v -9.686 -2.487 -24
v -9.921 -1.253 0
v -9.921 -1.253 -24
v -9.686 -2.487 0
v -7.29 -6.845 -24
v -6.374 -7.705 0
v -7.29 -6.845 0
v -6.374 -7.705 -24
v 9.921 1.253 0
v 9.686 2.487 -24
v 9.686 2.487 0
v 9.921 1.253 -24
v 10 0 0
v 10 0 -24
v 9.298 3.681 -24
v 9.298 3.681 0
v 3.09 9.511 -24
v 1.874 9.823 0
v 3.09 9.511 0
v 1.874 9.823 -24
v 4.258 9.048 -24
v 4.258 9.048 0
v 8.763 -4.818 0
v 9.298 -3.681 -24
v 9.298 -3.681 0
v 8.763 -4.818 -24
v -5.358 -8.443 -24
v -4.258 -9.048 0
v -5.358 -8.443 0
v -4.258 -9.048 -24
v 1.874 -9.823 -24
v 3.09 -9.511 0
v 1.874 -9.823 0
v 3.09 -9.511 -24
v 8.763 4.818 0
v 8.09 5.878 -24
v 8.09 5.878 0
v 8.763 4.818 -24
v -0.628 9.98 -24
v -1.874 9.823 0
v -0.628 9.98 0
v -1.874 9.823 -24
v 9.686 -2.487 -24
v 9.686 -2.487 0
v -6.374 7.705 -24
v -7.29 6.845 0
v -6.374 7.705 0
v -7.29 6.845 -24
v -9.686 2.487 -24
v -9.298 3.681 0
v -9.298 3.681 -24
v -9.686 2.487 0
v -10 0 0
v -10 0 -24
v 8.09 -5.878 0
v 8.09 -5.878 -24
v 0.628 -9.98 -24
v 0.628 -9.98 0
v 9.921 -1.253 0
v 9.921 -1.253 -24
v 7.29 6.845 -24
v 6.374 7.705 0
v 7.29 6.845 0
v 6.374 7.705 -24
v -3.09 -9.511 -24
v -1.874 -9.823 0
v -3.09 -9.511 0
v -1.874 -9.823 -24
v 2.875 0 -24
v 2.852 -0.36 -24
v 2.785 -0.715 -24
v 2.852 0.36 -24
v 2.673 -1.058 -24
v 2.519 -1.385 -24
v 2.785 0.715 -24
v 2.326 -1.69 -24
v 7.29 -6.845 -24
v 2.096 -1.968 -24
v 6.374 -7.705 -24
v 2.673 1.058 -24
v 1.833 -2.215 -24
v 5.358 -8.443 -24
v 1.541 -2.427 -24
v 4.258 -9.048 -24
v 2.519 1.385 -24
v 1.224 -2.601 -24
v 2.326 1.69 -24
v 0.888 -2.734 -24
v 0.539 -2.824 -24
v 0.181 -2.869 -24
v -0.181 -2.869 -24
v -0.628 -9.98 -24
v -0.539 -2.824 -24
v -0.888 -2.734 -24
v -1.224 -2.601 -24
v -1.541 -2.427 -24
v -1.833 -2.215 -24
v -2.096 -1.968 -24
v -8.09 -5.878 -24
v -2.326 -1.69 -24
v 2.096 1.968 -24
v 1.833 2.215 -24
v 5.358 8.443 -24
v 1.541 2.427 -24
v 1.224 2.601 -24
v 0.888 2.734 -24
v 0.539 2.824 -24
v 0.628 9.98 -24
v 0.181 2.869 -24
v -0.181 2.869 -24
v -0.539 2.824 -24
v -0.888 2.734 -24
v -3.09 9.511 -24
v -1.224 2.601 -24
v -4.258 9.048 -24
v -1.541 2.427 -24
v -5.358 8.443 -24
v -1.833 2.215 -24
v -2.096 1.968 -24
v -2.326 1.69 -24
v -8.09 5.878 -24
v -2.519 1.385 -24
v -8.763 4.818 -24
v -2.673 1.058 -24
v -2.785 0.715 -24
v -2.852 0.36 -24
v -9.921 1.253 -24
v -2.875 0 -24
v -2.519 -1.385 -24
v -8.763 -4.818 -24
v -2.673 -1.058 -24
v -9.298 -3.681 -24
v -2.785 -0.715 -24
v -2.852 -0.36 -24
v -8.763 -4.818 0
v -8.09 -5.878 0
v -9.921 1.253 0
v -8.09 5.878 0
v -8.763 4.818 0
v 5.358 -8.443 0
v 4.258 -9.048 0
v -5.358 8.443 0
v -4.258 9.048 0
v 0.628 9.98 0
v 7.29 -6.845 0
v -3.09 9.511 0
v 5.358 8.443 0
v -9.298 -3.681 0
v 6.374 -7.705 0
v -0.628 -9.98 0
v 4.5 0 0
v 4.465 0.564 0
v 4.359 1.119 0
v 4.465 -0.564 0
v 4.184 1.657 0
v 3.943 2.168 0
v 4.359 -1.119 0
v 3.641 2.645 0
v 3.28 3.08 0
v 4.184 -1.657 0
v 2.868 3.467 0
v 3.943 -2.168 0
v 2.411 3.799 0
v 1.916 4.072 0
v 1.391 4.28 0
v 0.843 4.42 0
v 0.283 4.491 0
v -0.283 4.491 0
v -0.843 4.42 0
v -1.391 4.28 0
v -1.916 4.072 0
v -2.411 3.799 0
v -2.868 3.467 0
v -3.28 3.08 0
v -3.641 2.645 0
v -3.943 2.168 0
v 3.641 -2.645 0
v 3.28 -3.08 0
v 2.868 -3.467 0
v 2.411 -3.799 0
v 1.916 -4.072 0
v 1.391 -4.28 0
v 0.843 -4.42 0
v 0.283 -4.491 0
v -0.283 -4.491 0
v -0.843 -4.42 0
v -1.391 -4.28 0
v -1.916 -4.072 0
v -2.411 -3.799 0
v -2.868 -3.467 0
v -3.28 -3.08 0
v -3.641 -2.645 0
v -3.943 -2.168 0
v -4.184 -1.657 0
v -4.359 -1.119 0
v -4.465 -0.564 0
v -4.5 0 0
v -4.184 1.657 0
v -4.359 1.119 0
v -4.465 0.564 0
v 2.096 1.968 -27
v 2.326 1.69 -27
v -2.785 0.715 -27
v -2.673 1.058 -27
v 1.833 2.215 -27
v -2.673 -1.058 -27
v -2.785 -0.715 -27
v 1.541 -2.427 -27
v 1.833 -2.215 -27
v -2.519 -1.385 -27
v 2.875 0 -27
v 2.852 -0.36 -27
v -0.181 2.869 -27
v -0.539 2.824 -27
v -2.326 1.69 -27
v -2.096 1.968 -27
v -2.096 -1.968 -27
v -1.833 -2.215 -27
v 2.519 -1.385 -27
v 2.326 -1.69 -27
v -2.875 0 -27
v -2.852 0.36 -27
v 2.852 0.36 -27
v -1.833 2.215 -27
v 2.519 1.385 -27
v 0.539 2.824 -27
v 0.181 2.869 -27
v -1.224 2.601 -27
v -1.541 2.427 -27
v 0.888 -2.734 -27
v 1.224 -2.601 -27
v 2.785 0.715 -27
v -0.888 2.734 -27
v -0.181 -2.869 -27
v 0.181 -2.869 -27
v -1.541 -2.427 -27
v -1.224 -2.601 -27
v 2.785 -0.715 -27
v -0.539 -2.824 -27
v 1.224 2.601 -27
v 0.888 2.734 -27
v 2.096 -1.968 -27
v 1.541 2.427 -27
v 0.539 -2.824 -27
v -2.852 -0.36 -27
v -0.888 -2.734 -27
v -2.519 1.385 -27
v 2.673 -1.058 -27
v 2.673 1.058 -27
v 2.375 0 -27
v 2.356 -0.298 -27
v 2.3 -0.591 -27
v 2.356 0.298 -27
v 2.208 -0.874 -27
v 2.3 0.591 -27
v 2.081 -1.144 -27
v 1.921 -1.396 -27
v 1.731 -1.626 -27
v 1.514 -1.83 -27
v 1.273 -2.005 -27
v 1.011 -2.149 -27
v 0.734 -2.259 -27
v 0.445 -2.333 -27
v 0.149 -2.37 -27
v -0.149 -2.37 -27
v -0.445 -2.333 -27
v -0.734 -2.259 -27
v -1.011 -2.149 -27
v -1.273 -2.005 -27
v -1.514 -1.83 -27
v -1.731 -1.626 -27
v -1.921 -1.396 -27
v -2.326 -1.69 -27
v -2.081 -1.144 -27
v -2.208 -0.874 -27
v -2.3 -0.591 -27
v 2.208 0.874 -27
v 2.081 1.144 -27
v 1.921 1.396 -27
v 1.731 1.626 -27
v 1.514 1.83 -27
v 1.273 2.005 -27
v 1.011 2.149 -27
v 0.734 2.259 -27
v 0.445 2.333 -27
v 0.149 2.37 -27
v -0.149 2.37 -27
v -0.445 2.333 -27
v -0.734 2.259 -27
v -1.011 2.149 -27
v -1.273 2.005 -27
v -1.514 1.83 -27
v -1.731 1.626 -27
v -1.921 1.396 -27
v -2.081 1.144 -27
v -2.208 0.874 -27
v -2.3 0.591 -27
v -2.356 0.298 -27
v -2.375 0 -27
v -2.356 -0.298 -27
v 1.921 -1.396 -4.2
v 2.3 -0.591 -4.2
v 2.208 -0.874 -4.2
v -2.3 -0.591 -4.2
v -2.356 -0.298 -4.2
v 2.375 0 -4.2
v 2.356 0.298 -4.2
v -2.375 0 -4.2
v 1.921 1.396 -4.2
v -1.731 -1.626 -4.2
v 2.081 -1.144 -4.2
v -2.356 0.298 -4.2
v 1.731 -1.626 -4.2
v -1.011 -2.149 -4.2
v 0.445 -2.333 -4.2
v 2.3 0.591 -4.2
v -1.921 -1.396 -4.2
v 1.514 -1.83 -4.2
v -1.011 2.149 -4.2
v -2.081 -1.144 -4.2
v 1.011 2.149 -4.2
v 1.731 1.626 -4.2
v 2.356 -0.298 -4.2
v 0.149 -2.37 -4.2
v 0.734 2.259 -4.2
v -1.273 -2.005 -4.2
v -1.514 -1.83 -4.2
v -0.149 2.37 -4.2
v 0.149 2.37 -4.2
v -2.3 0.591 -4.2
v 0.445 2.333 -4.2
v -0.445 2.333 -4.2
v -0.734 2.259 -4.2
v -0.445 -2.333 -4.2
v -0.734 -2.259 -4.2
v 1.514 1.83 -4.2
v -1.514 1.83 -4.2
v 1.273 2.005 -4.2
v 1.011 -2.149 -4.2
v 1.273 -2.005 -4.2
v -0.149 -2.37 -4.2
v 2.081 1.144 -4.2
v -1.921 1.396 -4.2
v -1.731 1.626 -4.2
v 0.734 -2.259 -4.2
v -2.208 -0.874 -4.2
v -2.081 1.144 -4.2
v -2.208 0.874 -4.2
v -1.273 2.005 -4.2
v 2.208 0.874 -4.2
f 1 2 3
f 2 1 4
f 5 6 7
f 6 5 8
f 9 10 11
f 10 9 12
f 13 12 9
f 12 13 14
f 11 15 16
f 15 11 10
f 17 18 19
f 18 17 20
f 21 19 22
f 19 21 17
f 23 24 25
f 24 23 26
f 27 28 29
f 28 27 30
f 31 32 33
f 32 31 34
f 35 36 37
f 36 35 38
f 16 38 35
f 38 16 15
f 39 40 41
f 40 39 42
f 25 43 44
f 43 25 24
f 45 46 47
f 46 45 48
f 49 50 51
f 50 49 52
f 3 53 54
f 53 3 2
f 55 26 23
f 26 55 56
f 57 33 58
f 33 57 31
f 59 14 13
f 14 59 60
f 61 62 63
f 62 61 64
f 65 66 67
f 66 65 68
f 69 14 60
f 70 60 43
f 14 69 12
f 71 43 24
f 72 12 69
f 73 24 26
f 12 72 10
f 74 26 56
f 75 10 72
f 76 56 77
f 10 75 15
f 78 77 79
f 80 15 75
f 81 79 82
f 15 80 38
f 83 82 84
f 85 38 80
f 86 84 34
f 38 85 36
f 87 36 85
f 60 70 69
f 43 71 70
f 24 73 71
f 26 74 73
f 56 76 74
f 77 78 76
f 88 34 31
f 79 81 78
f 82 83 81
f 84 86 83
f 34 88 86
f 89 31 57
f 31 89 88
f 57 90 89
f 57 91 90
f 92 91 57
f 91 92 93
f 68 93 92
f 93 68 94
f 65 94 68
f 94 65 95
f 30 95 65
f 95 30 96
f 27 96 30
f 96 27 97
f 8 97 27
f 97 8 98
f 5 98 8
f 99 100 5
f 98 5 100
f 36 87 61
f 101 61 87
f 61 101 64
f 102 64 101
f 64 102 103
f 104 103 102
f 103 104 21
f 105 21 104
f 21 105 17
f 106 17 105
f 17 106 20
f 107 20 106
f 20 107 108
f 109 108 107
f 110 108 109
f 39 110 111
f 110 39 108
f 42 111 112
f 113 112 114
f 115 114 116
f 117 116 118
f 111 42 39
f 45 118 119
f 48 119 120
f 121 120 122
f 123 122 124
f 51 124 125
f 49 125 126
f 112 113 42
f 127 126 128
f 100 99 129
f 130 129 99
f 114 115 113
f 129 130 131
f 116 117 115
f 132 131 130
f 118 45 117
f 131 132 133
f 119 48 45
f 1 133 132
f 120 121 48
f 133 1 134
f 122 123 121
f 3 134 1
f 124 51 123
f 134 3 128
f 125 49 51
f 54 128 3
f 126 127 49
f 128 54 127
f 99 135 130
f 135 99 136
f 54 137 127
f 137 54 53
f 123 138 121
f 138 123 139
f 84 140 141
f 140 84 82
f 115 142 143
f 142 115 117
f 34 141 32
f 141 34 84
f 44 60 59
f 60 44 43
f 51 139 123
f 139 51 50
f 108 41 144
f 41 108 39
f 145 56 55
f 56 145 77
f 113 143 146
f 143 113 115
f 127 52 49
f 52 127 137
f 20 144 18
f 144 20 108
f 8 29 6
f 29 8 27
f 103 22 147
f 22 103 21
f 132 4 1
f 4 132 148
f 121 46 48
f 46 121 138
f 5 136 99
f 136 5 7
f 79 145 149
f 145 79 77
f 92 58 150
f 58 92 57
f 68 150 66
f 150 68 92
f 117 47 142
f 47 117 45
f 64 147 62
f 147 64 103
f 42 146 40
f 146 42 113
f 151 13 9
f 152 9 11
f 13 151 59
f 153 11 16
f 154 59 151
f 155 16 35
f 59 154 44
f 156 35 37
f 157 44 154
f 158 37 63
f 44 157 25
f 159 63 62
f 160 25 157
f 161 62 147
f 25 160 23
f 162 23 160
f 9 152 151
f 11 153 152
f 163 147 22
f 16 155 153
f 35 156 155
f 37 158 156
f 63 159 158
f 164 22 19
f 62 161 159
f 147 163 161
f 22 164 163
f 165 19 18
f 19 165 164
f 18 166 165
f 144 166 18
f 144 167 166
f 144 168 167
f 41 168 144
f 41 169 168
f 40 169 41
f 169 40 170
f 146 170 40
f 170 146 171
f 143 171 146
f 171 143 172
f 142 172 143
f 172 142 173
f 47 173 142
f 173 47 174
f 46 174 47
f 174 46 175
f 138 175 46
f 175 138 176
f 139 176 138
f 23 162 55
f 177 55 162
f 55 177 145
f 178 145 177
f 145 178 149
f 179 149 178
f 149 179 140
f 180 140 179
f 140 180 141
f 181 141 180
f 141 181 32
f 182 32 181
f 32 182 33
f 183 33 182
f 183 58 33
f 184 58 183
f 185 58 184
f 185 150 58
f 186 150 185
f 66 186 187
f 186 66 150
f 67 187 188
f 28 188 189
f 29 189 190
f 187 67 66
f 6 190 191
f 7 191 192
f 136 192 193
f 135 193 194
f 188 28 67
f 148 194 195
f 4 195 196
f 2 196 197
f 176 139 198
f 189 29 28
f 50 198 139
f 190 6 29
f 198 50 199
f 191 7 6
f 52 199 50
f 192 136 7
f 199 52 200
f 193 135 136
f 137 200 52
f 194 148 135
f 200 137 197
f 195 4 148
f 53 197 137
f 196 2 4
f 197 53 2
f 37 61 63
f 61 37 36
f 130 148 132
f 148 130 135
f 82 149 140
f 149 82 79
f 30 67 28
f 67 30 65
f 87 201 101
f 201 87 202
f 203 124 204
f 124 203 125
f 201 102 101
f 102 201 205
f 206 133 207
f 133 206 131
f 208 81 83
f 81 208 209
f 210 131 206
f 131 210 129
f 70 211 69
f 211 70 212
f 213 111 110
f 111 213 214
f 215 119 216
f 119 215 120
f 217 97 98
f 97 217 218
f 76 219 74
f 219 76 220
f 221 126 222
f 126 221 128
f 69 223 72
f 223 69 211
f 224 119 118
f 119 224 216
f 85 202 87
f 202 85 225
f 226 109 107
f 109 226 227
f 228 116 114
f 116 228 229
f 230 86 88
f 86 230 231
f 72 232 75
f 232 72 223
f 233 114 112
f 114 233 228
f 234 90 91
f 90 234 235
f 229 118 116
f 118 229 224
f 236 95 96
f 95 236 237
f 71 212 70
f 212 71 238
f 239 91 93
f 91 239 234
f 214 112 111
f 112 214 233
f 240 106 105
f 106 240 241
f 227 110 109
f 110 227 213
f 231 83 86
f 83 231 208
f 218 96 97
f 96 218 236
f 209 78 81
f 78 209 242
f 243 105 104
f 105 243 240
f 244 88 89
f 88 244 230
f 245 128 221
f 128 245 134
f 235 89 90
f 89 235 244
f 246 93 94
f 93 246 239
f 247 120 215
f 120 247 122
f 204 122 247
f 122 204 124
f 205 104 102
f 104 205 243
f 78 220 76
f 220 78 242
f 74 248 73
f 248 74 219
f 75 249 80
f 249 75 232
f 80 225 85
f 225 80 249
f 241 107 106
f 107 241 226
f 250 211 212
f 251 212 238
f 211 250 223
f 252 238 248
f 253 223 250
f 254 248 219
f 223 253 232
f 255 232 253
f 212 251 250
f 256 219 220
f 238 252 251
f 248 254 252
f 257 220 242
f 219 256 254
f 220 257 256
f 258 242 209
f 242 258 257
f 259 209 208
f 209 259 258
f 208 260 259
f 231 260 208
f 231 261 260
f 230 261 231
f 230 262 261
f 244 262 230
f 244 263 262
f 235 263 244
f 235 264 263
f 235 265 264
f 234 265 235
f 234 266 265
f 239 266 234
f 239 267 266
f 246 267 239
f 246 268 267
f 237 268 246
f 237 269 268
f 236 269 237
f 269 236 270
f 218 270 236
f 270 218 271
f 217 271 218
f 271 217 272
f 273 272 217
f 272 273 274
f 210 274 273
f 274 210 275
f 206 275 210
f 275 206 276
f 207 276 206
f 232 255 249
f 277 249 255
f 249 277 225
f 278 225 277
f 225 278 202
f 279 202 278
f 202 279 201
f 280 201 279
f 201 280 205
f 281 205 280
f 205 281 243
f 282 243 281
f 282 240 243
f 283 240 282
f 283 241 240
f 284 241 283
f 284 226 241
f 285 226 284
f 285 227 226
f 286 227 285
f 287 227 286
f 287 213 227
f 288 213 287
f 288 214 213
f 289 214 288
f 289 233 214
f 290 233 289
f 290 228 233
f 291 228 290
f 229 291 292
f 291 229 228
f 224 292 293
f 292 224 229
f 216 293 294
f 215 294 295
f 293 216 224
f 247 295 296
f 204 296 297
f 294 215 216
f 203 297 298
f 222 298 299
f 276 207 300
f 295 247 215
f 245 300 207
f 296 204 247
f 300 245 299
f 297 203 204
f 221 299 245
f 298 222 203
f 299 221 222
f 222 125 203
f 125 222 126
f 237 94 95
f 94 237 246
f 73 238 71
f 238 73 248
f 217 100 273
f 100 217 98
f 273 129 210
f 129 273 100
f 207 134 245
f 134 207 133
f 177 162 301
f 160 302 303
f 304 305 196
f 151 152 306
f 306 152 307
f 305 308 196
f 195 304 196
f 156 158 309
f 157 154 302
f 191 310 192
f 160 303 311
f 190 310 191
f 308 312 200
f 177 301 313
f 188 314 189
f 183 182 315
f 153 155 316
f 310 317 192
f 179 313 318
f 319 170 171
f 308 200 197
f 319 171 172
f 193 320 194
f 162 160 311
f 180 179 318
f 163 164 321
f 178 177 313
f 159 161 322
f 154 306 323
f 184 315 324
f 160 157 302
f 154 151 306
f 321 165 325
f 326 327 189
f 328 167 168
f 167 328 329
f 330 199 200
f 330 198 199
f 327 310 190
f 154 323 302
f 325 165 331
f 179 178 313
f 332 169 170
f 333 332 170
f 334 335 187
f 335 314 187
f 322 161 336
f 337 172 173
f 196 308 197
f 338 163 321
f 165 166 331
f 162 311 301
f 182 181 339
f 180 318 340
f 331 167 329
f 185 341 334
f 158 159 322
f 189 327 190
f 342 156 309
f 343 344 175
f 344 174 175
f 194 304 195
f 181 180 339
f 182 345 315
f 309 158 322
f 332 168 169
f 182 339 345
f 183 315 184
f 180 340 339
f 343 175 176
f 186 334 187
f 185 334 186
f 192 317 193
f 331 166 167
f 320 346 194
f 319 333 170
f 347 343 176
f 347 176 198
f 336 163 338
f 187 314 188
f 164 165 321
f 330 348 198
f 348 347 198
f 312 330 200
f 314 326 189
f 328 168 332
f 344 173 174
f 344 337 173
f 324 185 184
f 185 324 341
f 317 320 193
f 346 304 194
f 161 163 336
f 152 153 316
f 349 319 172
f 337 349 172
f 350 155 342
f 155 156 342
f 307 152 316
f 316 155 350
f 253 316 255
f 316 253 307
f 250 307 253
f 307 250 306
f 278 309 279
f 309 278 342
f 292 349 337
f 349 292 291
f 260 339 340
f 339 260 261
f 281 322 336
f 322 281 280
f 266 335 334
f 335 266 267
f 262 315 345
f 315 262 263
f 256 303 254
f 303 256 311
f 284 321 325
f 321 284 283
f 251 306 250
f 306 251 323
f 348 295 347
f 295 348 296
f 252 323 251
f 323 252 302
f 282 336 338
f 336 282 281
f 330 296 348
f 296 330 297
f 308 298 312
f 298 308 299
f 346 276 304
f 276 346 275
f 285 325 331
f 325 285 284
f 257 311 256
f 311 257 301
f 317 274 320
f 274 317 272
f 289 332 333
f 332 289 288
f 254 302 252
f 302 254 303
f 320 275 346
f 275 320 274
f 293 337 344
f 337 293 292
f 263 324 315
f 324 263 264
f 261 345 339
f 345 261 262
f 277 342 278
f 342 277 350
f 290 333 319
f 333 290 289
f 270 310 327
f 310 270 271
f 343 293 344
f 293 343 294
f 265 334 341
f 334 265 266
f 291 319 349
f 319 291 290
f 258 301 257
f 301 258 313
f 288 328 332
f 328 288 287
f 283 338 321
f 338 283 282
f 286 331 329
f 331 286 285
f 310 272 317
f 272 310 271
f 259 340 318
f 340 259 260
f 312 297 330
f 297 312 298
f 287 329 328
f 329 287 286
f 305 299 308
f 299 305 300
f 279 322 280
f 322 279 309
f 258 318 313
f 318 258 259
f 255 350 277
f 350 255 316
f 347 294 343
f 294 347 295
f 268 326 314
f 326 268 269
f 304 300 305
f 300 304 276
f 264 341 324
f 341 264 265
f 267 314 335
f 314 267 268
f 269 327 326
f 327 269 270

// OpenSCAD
$fn = 50;


difference() {
	union() {
		translate(v = [0, 0, -24.0000000000]) {
			cylinder(h = 24, r = 10.0000000000);
		}
		#translate(v = [0, 0, -27.0000000000]) {
			cylinder(h = 27, r = 2.8750000000);
		}
	}
	union() {
		translate(v = [0, 0, 0]) {
			rotate(a = [0, 0, 0]) {
				difference() {
					union() {
						translate(v = [0, 0, -27.0000000000]) {
							cylinder(h = 27, r = 2.2500000000);
						}
						translate(v = [0, 0, -4.2000000000]) {
							cylinder(h = 4.2000000000, r1 = 2.3750000000, r2 = 4.5000000000);
						}
						translate(v = [0, 0, -27.0000000000]) {
							cylinder(h = 27, r = 2.3750000000);
						}
						translate(v = [0, 0, -27.0000000000]) {
							cylinder(h = 27, r = 2.2500000000);
						}
					}
					union();
				}
			}
		}
	}
}
